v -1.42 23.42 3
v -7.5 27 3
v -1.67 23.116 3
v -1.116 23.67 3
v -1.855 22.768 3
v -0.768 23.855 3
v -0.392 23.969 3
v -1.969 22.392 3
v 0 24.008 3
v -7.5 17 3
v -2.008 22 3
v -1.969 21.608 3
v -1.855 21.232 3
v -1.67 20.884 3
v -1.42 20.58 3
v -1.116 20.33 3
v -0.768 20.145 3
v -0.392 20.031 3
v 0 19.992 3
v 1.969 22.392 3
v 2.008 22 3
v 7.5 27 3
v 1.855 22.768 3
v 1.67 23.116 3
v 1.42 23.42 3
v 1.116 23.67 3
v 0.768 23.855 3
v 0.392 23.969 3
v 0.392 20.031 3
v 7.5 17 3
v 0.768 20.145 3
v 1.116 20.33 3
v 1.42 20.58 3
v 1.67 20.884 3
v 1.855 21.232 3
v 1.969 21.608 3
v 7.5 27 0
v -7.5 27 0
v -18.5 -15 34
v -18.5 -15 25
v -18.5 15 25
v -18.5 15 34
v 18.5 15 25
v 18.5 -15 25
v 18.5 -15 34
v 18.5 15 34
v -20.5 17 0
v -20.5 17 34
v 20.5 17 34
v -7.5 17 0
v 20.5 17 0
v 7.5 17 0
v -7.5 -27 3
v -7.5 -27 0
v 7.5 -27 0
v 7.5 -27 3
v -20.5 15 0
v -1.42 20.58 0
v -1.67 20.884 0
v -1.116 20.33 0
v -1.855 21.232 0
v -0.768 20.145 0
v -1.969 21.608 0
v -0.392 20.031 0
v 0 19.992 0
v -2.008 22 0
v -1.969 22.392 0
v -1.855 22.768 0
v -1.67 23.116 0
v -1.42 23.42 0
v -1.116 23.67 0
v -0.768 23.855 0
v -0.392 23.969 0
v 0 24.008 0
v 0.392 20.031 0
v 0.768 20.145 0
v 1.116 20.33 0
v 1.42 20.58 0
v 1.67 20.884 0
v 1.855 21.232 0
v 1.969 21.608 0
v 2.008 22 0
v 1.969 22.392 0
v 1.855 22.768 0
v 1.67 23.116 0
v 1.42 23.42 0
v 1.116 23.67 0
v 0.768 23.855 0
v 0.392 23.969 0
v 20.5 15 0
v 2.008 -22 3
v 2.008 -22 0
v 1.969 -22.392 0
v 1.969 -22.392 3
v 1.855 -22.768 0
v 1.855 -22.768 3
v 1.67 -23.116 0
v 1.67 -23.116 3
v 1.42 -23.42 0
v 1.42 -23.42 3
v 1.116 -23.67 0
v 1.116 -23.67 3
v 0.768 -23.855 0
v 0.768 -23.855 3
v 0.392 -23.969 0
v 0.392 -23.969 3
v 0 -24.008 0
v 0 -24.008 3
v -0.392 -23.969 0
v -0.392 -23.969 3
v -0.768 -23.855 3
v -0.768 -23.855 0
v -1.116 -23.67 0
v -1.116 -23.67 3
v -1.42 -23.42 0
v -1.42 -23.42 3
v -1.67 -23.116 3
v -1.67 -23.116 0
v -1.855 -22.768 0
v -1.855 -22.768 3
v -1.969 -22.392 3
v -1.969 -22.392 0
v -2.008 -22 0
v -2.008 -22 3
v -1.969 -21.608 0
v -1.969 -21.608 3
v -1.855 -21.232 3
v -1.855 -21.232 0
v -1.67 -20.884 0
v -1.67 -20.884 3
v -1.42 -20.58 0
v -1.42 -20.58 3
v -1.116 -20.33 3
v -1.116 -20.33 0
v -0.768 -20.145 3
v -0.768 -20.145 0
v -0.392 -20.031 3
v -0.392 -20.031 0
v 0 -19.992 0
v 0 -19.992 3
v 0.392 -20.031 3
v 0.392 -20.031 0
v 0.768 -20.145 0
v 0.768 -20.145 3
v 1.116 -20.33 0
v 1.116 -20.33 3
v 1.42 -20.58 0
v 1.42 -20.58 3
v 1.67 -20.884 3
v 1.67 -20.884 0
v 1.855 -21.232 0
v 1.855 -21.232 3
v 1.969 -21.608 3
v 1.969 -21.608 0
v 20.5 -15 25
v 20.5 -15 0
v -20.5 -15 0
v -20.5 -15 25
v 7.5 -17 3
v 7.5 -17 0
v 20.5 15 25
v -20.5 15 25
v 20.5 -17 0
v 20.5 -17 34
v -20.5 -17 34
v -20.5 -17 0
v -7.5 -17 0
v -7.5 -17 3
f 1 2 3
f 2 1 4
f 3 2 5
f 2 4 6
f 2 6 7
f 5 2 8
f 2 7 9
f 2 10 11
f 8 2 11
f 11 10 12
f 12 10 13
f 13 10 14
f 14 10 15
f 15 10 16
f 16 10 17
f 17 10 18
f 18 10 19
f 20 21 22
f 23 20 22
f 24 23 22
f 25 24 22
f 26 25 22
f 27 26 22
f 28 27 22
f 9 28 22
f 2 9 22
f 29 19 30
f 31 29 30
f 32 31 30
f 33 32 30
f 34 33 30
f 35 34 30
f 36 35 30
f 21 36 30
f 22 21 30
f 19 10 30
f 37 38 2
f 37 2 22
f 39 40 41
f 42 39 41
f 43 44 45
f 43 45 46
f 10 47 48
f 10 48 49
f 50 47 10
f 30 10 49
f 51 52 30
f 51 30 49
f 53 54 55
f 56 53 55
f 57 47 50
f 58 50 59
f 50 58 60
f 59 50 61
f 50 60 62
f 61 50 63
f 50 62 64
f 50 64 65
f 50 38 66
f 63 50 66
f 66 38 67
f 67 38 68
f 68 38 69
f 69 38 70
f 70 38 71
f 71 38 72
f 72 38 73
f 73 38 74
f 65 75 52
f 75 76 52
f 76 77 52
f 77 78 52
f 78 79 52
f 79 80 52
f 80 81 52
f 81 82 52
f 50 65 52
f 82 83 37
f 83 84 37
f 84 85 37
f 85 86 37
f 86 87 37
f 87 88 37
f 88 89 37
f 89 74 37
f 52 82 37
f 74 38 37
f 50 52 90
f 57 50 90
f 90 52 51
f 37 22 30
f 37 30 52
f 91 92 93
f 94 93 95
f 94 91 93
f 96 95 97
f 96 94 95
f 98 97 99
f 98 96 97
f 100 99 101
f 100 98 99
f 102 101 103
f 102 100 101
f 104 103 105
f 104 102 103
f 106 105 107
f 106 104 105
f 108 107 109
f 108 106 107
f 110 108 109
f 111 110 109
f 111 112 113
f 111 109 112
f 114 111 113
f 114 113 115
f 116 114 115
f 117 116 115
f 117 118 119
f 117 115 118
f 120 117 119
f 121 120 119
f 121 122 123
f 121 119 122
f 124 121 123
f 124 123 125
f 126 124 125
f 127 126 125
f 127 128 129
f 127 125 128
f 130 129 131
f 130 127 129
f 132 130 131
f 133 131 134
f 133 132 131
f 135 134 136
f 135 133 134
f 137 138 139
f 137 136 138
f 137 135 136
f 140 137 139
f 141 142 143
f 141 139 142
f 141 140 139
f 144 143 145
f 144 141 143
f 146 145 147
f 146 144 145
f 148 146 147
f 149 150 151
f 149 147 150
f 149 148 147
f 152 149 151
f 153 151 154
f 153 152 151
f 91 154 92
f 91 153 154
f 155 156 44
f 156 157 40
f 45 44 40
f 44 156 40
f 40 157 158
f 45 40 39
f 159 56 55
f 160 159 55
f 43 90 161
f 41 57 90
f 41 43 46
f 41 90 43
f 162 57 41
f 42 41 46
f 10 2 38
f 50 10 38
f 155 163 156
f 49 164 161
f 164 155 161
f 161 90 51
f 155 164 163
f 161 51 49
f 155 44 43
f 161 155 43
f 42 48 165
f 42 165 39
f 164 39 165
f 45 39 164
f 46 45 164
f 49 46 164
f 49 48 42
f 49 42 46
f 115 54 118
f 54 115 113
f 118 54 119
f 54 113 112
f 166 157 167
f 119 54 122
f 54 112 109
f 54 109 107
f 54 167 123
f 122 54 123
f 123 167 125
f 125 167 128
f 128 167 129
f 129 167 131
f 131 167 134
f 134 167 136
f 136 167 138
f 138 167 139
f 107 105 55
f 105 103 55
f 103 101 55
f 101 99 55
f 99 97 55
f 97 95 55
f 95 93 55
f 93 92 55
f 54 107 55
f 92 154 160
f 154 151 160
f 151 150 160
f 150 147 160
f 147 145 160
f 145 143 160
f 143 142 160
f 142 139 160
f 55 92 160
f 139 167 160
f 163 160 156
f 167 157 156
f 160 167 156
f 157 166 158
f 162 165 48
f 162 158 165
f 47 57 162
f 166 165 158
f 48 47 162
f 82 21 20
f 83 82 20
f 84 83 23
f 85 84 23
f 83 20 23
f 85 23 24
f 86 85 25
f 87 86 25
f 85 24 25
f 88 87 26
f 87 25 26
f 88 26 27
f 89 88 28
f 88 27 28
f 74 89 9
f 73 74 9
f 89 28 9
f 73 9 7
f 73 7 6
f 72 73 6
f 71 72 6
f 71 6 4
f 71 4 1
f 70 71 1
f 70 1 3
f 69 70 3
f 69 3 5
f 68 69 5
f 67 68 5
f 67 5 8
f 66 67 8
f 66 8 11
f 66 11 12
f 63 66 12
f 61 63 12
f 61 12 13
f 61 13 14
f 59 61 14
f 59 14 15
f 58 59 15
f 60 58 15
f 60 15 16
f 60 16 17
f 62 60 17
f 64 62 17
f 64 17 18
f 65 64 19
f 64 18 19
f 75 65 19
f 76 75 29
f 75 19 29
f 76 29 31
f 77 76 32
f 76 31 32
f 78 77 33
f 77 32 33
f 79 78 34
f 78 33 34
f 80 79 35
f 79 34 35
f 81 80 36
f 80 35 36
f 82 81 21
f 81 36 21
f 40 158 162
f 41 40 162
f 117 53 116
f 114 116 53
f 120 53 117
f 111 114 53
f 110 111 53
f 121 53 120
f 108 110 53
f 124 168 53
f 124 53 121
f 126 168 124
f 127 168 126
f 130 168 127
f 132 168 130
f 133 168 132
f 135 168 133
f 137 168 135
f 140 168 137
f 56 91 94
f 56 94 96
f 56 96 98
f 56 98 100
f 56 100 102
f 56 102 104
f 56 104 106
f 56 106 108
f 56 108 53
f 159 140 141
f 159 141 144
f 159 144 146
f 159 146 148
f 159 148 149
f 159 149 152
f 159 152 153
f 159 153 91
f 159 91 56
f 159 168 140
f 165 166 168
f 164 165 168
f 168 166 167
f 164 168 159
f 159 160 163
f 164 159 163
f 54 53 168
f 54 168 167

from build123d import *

# Parameters (mm, degrees)
SKETCH_1_W          = 41
SKETCH_1_H          = 34
SKETCH_1_W_2        = 37
SKETCH_1_H_2        = 30
EXTRUDE_1_DEPTH     = 34
SKETCH_2_W          = 15
SKETCH_2_H          = 3
EXTRUDE_2_DEPTH     = 10
SKETCH_3_R          = 2.008063055
CUT_EXTRUDE_1_DEPTH = 10
SKETCH_4_W          = 25
SKETCH_4_H          = 30
CUT_EXTRUDE_2_DEPTH = 60


with BuildPart() as part:
    # 草圖1 → 填料-伸長1 (new body)
    with BuildSketch(Plane.XY):
        Rectangle(SKETCH_1_W, SKETCH_1_H)
        Rectangle(SKETCH_1_W_2, SKETCH_1_H_2, mode=Mode.SUBTRACT)
    extrude(amount=EXTRUDE_1_DEPTH)

    # 草圖2 → 填料-伸長2 (add)
    with BuildSketch(Plane(origin=(0, 17, 0), x_dir=(1, 0, 0), z_dir=(0, 1, 0))):
        with Locations((0, -1.5)):
            Rectangle(SKETCH_2_W, SKETCH_2_H)
    extrude_2 = extrude(amount=EXTRUDE_2_DEPTH)

    # 草圖3 → 除料-伸長1 (cut)
    with BuildSketch(Plane.XY.offset(3)):
        with Locations((0, 22)):
            Circle(SKETCH_3_R)
    cut_extrude_1 = extrude(amount=-CUT_EXTRUDE_1_DEPTH, mode=Mode.SUBTRACT)

    # 鏡射1: 填料-伸長2, 除料-伸長1 across plane
    add(extrude_2.mirror(Plane.ZX))
    add(cut_extrude_1.mirror(Plane.ZX), mode=Mode.SUBTRACT)

    # 草圖4 → 除料-伸長2 (cut)
    with BuildSketch(Plane.ZY.offset(20.5)):
        with Locations((12.5, 0)):
            Rectangle(SKETCH_4_W, SKETCH_4_H)
    extrude(amount=-CUT_EXTRUDE_2_DEPTH, mode=Mode.SUBTRACT)


solid = part.part
